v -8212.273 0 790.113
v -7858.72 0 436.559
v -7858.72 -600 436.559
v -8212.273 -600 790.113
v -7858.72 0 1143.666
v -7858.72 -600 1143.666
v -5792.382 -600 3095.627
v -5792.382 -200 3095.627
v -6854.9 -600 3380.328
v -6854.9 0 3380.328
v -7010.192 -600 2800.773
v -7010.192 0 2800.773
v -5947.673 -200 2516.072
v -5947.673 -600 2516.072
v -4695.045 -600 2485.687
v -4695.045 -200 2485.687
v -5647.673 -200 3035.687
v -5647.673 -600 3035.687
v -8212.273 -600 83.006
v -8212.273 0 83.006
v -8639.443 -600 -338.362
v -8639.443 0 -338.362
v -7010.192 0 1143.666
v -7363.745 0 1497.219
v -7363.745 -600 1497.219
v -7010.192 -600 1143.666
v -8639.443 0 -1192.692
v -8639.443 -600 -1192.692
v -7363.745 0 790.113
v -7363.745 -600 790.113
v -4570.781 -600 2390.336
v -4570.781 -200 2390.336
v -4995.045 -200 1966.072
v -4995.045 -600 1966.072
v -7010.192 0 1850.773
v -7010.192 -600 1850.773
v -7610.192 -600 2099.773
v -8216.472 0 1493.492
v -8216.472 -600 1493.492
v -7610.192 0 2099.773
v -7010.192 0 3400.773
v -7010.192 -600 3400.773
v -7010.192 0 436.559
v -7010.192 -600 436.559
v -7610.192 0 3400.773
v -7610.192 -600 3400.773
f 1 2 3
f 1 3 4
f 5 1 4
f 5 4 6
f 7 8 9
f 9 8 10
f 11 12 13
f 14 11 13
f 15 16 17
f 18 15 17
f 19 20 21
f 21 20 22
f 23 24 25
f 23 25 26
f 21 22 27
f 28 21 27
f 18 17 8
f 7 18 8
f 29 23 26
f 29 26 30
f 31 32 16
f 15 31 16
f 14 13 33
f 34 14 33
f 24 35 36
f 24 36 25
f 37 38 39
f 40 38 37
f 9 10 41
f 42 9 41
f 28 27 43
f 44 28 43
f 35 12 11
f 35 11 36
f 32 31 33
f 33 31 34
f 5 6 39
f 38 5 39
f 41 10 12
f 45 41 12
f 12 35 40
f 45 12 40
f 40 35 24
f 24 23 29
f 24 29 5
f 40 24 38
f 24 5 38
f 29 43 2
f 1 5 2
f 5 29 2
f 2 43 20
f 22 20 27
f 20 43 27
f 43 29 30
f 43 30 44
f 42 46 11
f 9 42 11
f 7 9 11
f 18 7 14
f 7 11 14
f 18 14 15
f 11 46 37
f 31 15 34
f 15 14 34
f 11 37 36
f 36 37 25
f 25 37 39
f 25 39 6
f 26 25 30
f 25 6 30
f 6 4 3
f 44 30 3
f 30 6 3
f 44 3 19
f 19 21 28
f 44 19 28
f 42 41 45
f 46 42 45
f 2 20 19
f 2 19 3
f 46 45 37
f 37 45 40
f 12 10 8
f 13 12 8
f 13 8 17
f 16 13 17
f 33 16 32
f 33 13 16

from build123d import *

# Parameters (mm, degrees)
BOSS_EXTRUDE1_DEPTH      = 600
CUT_EXTRUDE9_DEPTH       = 8723.868006427
CUT_EXTRUDE9_DEPTH_BACK  = 8723.868006427
CUT_EXTRUDE_THIN1_DEPTH  = 8723.868006427
CUT_EXTRUDE40_DEPTH      = 400
CUT_EXTRUDE42_DEPTH      = 8272.33671098
CUT_EXTRUDE42_DEPTH_BACK = 8272.33671098
CUT_EXTRUDE43_DEPTH      = 200
CUT_EXTRUDE44_DEPTH      = 8662.204945729
CUT_EXTRUDE44_DEPTH_BACK = 8662.204945729
SKETCH20_W               = 1000
SKETCH20_H               = 600
CUT_EXTRUDE45_DEPTH      = 600
CUT_EXTRUDE46_DEPTH      = 600
BOSS_EXTRUDE2_DEPTH      = 600
BOSS_EXTRUDE3_DEPTH      = 600
BOSS_EXTRUDE4_DEPTH      = 600
BOSS_EXTRUDE5_REACH      = 8720.017
SKETCH27_W               = 600.055718855
SKETCH27_H               = 600
CUT_EXTRUDE47_DEPTH      = 500
CUT_EXTRUDE48_DEPTH      = 500
CUT_EXTRUDE49_DEPTH      = 500


with BuildPart() as part:
    # Sketch1 → Boss-Extrude1 (new body)
    with BuildSketch(Plane(origin=(0, 0, 0), x_dir=(1, 0, 0), z_dir=(0, 1, 0))):
        Polygon((0, 0), (-1000, 0), (-2062.518408918, -284.700949613), (-3015.146353081, -834.700949613), (-3792.963812386, -1612.518408918), (-4570.781271691, -2390.335868223), (-4695.045340403, -2485.687041782), (-5647.673284566, -3035.687041782), (-5792.381857505, -3095.627295285), (-6854.900266423, -3380.328244897), (-7010.191693484, -3400.772749124), (-8010.191693484, -3400.772749124), (-8010.191693484, -2800.772749124), (-7010.191693484, -2800.772749124), (-5947.673284566, -2516.071799511), (-4995.045340403, -1966.071799511), (-4217.227881098, -1188.254340206), (-3439.410421793, -410.436880901), (-3315.146353081, -315.085707342), (-2362.518408918, 234.914292658), (-2217.809835979, 294.854546161), (-1155.291427062, 579.555495773), (-1000, 600), (0, 600), align=None)
    extrude(amount=-BOSS_EXTRUDE1_DEPTH)

    # Sketch7 → Cut-Extrude9 (cut, two sides)
    with BuildSketch(Plane.XY) as cut_extrude9_sk:
        Polygon((-1000, 14081.643483175), (-1000, 0), (-1000, -600), (-2062.518408918, -400), (-3015.146353081, -400), (-3015.146353081, 0), (-3015.146353081, 14081.643483175), (-3015.146353081, 42244.930449524), (-1000, 42244.930449524), align=None)
    extrude(amount=CUT_EXTRUDE9_DEPTH, mode=Mode.SUBTRACT)
    extrude(cut_extrude9_sk.sketch, amount=-CUT_EXTRUDE9_DEPTH_BACK, mode=Mode.SUBTRACT)


with BuildPart() as cut_extrude9_piece_1:
    # of the separate pieces the step leaves, piece 1, a body of its own (cut_extrude9_pieces)
    add(part.part.solids().sort_by_distance((-2062.518408918, -400, 284.700949613))[0])

    # Sketch14 → Cut-Extrude40 (cut)
    with BuildSketch(Plane(origin=(0, -400, 0), x_dir=(1, 0, 0), z_dir=(0, 1, 0))):
        Polygon((-3015.146353081, -834.700949613), (-3439.410421793, -410.436880901), (-3315.146353081, -315.085707342), (-3015.146353081, -141.880626585), align=None)
    extrude(amount=CUT_EXTRUDE40_DEPTH, mode=Mode.SUBTRACT)

    # Sketch17 → Cut-Extrude42 (cut, two sides)
    with BuildSketch(Plane(origin=(-1090.222701734, 0, -1090.222701734), x_dir=(0.7071067811865475, 0, -0.7071067811865477), z_dir=(0.7071067811865477, 0, 0.7071067811865475))) as cut_extrude42_sk:
        Polygon((-4922.253134267, 10770.157285422), (-4922.253134267, 0), (-4922.253134267, -200), (-2722.253134267, -400), (-2722.253134267, 0), (-2722.253134267, 10770.157285422), (-2722.253134267, 32310.471856265), (-4922.253134267, 32310.471856265), align=None)
    extrude(amount=CUT_EXTRUDE42_DEPTH, mode=Mode.SUBTRACT)
    extrude(cut_extrude42_sk.sketch, amount=-CUT_EXTRUDE42_DEPTH_BACK, mode=Mode.SUBTRACT)

    # Sketch18 → Cut-Extrude43 (cut)
    with BuildSketch(Plane(origin=(0, 0, 0), x_dir=(1, 0, 0), z_dir=(0, 1, 0))):
        Polygon((-4570.781271691, -2390.335868223), (-4995.045340403, -1966.071799511), (-5947.673284566, -2516.071799511), (-5792.381857505, -3095.627295285), (-5647.673284566, -3035.687041782), (-4695.045340403, -2485.687041782), align=None)
    extrude(amount=-CUT_EXTRUDE43_DEPTH, mode=Mode.SUBTRACT)

    # Sketch19 → Cut-Extrude44 (cut, two sides)
    with BuildSketch(Plane(origin=(385.890813578, 0, 1440.164122449), x_dir=(0.9659258262890701, 0, -0.2588190451025142), z_dir=(0.2588190451025142, 0, 0.9659258262890701))) as cut_extrude44_sk:
        Polygon((-7496.218532451, 0), (-6396.218532451, -200), (-6396.218532451, 0), align=None)
    extrude(amount=CUT_EXTRUDE44_DEPTH, mode=Mode.SUBTRACT)
    extrude(cut_extrude44_sk.sketch, amount=-CUT_EXTRUDE44_DEPTH_BACK, mode=Mode.SUBTRACT)

    # Sketch20 → Cut-Extrude45 (cut)
    with BuildSketch(Plane(origin=(0, 0, 0), x_dir=(1, 0, 0), z_dir=(0, 1, 0))):
        with Locations((-7510.191693484, -3100.772749124)):
            Rectangle(SKETCH20_W, SKETCH20_H)
    extrude(amount=-CUT_EXTRUDE45_DEPTH, mode=Mode.SUBTRACT)

    # Sketch22 → Boss-Extrude2 (add)
    with BuildSketch(Plane(origin=(0, 0, 0), x_dir=(1, 0, 0), z_dir=(0, 1, 0))):
        Polygon((-7010.191693484, -3400.772749124), (-7610.191693484, -3400.772749124), (-7610.191693484, -2099.772749124), (-7010.191693484, -1850.772749124), (-7010.191693484, -2800.772749124), align=None)
    extrude(amount=-BOSS_EXTRUDE2_DEPTH)

    # Sketch23 → Boss-Extrude3 (add)
    with BuildSketch(Plane(origin=(0, 0, 0), x_dir=(1, 0, 0), z_dir=(0, 1, 0))):
        Polygon((-7010.191693484, -1850.772749124), (-7363.745084077, -1497.219358531), (-7010.191693484, -1143.665967937), (-7363.745084077, -790.112577344), (-7010.191693484, -436.559186751), (-7369.52720003, -77.223680205), (-7793.791268742, 347.040388507), (-7858.719830908, 270.547594436), (-8212.273221501, -83.005796158), (-7858.719830908, -436.559186751), (-8212.273221501, -790.112577344), (-7858.719830908, -1143.665967937), (-8216.472118741, -1493.492323867), (-7610.191693484, -2099.772749124), align=None)
    extrude(amount=-BOSS_EXTRUDE3_DEPTH)

    # Sketch27 → Boss-Extrude5 (add, up to next)
    with BuildSketch(Plane(origin=(-4176.549949048, 0, -4064.239704482), x_dir=(0.6974051569050131, 0, -0.7166770870638283), z_dir=(0.7166770870638283, 0, 0.6974051569050131)), mode=Mode.PRIVATE) as boss_extrude5_sk1:
        with Locations((-5486.74218736, -300)):
            Rectangle(SKETCH27_W, SKETCH27_H)
    boss_extrude5_tool1 = extrude(boss_extrude5_sk1.sketch, amount=BOSS_EXTRUDE5_REACH, mode=Mode.PRIVATE) - cut_extrude9_piece_1.part


with BuildPart() as cut_extrude9_piece_2:
    # of the separate pieces the step leaves, piece 2, a body of its own (cut_extrude9_pieces)
    add(part.part.solids().sort_by_distance((0, 0, 0))[0])

    # Sketch8 → Cut-Extrude-Thin1 (cut, through all)
    with BuildSketch(Plane.XY):
        Polygon((-1000, 0), (-1000, -600), (0, -600), (0, 0), (-10, 0), (-10, -590), (-990, -590), (-990, 0), align=None)
        Polygon((-4695.045340403, 0), (-4695.045340403, -200), (-4570.781271691, -200), (-3015.146353081, -400), (-3013.871199655, -390.081634019), (-4570.141081915, -190), (-4685.045340403, -190), (-4685.045340403, 0), align=None)
    extrude(amount=-CUT_EXTRUDE_THIN1_DEPTH, mode=Mode.SUBTRACT)

    # Sketch21 → Cut-Extrude46 (cut)
    with BuildSketch(Plane(origin=(0, 0, 0), x_dir=(1, 0, 0), z_dir=(0, 1, 0))):
        Polygon((0, 0), (-10, 600), (-990, 600), (-1000, 0), align=None)
    extrude(amount=-CUT_EXTRUDE46_DEPTH, mode=Mode.SUBTRACT)


with BuildPart() as body_2:
    # Sketch24 → Boss-Extrude4 (new body)
    with BuildSketch(Plane(origin=(0, 0, 0), x_dir=(1, 0, 0), z_dir=(0, 1, 0))):
        Polygon((-8212.273221501, -83.005796158), (-8639.443107058, 338.362406502), (-8639.443107058, 1192.692226823), (-7793.791268742, 347.040388507), align=None)
    extrude(amount=-BOSS_EXTRUDE4_DEPTH)


with BuildPart() as cut_extrude9_piece_1_1:
    add(cut_extrude9_piece_1.part)

    add(body_2.part)  # Boss-Extrude5 merges body 2
    add(boss_extrude5_tool1.solids().sort_by_distance((-8003.032245, -300, -132.017296))[0])

    # Sketch38 → Cut-Extrude47 (cut)
    with BuildSketch(Plane.XZ.offset(600)):
        Polygon((-4570.781271691, 2390.335868223), (-4995.045340403, 1966.071799511), (-3439.410421793, 410.436880901), (-3315.146353081, 315.085707342), (-2217.809835979, -294.854546161), (-2062.518408918, -336.464758633), (-1000, -600), (-1000, 0), (-2062.518408918, 284.700949613), (-3015.146353081, 834.700949613), align=None)
    extrude(amount=-CUT_EXTRUDE47_DEPTH, mode=Mode.SUBTRACT)


with BuildPart() as cut_extrude47_piece_1:
    # of the separate pieces the step leaves, piece 1, a body of its own (cut_extrude47_pieces)
    add(cut_extrude9_piece_1_1.part.solids().sort_by_distance((-4570.781271691, -600, 2390.335868223))[0])


with BuildPart() as cut_extrude47_piece_2:
    # of the separate pieces the step leaves, piece 2, a body of its own (cut_extrude47_pieces)
    add(cut_extrude9_piece_1_1.part.solids().sort_by_distance((-2362.518408918, -600, -234.914292658))[0])

    # Sketch40 → Cut-Extrude49 (cut)
    with BuildSketch(Plane(origin=(0, -600, 0), x_dir=(-1, 0, 0), z_dir=(0, -1, 0))):
        Polygon((2362.518408918, 234.914292658), (2217.809835979, 294.854546161), (3315.146353081, -315.085707342), align=None)
    extrude(amount=-CUT_EXTRUDE49_DEPTH, mode=Mode.SUBTRACT)


with BuildPart() as cut_extrude47_piece_3:
    # of the separate pieces the step leaves, piece 3, a body of its own (cut_extrude47_pieces)
    add(cut_extrude9_piece_1_1.part.solids().sort_by_distance((-1155.291427062, -570.769179008, -579.555495773))[0])

    # Sketch39 → Cut-Extrude48 (cut)
    with BuildSketch(Plane(origin=(0, -600, 0), x_dir=(-1, 0, 0), z_dir=(0, -1, 0))):
        Polygon((1155.291427062, 579.555495773), (1000, 600), (2062.518408918, 336.464758633), align=None)
    extrude(amount=-CUT_EXTRUDE48_DEPTH, mode=Mode.SUBTRACT)


solid = cut_extrude47_piece_1.part
